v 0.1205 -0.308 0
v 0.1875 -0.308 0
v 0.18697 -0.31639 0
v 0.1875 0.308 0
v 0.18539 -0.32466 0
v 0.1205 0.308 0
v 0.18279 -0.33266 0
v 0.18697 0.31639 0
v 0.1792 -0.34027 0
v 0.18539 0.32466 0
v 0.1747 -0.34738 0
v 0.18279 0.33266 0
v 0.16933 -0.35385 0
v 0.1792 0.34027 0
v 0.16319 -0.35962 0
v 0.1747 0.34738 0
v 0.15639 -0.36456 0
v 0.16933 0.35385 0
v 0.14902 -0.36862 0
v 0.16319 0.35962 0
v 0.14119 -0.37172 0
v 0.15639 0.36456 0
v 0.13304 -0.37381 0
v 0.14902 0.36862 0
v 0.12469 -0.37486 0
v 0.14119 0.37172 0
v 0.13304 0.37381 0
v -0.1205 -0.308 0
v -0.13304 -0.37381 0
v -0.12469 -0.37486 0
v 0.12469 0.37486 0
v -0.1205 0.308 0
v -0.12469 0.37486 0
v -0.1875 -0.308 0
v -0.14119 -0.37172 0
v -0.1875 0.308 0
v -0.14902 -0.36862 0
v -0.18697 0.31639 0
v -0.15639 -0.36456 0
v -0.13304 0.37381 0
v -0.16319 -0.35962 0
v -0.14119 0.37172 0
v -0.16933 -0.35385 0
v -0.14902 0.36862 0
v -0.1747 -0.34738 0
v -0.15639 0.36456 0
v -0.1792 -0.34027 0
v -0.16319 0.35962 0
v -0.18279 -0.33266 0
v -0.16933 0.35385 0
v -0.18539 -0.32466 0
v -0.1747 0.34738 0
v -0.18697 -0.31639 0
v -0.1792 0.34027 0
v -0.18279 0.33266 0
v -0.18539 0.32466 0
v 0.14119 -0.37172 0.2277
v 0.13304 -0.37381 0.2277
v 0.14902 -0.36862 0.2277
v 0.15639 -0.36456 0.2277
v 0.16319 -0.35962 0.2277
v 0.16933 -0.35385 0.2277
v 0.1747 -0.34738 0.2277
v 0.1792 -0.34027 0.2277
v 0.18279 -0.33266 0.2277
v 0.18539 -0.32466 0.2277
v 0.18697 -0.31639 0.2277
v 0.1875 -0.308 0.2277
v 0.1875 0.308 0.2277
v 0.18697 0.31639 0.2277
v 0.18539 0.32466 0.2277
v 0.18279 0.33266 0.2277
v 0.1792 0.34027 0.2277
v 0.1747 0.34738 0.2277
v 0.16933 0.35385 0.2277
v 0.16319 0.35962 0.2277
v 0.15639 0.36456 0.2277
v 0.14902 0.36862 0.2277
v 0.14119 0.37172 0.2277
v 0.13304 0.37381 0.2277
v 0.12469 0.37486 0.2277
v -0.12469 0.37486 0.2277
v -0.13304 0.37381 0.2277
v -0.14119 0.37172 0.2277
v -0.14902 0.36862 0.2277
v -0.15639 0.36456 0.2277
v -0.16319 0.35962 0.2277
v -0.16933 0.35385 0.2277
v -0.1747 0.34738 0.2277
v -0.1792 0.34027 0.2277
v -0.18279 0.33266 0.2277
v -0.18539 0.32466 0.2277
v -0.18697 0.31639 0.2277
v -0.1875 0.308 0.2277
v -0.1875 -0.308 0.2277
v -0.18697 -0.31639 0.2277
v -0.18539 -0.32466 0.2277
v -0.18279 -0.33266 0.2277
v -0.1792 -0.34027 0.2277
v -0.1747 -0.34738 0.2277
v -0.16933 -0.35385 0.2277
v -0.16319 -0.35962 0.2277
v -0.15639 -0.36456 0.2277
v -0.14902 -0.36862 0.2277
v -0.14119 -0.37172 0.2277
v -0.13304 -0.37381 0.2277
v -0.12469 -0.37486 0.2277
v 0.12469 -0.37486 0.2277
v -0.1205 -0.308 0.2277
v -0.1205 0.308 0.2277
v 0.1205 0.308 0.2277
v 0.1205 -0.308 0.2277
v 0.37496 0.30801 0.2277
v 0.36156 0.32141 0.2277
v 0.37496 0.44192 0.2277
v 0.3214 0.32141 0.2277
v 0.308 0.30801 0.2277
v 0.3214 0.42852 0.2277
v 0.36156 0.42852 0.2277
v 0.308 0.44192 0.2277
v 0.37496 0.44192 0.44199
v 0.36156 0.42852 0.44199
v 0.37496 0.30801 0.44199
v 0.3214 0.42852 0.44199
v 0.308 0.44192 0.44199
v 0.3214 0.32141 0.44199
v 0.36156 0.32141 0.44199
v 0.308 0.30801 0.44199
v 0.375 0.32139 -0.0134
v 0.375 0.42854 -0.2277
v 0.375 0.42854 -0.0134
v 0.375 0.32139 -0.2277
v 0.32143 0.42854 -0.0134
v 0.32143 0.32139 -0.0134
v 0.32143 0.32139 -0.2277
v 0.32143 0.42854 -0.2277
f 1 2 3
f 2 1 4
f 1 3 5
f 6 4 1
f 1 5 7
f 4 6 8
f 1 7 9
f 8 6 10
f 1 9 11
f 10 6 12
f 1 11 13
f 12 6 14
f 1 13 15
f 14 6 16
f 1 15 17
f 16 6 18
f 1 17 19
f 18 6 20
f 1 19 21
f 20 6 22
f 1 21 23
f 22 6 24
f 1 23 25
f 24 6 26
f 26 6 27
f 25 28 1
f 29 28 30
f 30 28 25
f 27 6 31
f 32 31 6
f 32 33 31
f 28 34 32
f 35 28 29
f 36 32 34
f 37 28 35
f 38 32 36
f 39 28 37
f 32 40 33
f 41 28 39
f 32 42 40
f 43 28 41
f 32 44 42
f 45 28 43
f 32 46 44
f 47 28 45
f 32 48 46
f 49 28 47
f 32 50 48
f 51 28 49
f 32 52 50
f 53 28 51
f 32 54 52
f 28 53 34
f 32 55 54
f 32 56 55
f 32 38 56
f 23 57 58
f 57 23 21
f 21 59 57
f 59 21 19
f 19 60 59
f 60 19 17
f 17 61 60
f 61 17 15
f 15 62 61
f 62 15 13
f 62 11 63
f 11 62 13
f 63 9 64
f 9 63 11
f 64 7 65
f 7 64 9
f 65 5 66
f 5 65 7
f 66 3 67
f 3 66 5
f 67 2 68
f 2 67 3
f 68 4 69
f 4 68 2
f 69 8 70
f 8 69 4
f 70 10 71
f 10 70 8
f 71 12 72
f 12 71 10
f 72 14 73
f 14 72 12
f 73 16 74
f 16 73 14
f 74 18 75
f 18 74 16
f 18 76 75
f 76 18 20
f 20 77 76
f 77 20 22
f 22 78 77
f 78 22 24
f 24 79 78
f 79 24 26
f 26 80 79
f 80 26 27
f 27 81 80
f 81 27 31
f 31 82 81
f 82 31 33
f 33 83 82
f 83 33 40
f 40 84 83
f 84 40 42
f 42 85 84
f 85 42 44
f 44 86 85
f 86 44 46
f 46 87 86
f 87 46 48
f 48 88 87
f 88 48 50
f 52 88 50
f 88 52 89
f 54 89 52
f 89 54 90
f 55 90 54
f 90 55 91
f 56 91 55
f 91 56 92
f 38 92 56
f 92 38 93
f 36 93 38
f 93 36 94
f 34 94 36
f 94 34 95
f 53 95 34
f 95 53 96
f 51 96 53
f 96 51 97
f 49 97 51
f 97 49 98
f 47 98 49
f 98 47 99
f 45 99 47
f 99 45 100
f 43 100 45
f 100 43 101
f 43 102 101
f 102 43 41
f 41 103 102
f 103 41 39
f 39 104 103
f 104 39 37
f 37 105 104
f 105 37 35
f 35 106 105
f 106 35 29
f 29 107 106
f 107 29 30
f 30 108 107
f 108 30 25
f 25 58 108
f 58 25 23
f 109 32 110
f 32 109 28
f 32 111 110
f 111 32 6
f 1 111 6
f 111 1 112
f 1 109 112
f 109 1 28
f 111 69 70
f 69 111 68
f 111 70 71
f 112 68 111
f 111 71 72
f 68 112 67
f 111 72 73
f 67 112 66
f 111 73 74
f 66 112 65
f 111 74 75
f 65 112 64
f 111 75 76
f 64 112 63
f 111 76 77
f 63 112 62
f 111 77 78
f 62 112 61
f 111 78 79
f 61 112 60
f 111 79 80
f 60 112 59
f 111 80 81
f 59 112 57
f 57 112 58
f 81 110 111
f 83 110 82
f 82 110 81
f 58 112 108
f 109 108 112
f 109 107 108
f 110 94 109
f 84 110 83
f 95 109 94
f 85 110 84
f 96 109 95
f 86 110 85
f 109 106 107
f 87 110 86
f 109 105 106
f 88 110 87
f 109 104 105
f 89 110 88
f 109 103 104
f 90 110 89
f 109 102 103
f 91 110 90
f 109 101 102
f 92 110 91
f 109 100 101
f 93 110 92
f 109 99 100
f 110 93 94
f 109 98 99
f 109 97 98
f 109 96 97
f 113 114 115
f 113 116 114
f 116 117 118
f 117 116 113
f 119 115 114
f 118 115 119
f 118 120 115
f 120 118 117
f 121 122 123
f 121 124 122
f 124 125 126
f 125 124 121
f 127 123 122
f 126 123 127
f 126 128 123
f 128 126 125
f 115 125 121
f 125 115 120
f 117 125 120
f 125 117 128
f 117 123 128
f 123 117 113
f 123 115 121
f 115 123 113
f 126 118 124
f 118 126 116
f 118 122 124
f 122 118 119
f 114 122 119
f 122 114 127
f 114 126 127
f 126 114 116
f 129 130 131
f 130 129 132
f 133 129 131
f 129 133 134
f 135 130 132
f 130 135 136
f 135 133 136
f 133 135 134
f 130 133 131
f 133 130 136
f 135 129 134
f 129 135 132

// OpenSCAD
// Parameters
base_length = 0.375;
base_width = 0.75;
base_height = 0.013393;
base_corner_r = 0.067;          // Corner radius derived from footprint geometry
$fn = 50;

body_reach = 0.2277;
body_height = body_reach - base_height;

// Inner opening for frame profile (constant wall = corner radius)
inner_length = base_length - 2 * base_corner_r;
inner_width = base_width - 2 * base_corner_r;

// Raised sleeve/post
sleeve_length = 0.066964;
sleeve_width = 0.133929;
sleeve_height = 0.214286;
sleeve_left = 0.308;
sleeve_front = 0.308;
sleeve_wall = 0.0134;

// Lower continuation post
lower_top = -0.0134;
lower_bottom = -0.2277;
lower_height = lower_top - lower_bottom;
lower_length = sleeve_length * 0.8;
lower_width = sleeve_width * 0.8;

// Side blind holes
hole_radius = 0.0067;
hole_depth = 0.0134;
hole_x = 0.3616;
hole_y1 = 0.0672;
hole_y2 = 0.6828;
hole_z = (0.1674 + 0.1808) / 2;

// 2D rounded rectangle with exact bounding box
module rounded_rect(w, h, r) {
    dx = w/2 - r;
    dy = h/2 - r;
    hull() {
        translate([-dx, -dy]) circle(r);
        translate([ dx, -dy]) circle(r);
        translate([-dx,  dy]) circle(r);
        translate([ dx,  dy]) circle(r);
    }
}

// Base & body profile: outer rounded rect with central rectangular opening
module frame_profile() {
    difference() {
        rounded_rect(base_length, base_width, base_corner_r);
        square([inner_length, inner_width], center=true);
    }
}

// Sleeve profile: hollow rectangular tube
module sleeve_profile() {
    difference() {
        square([sleeve_length, sleeve_width], center=true);
        square([sleeve_length - 2*sleeve_wall, sleeve_width - 2*sleeve_wall], center=true);
    }
}

// Main assembly
difference() {
    union() {
        // Base flange (z = 0 to base_height)
        linear_extrude(height = base_height)
            frame_profile();

        // Second upper solid (z = base_height to body_reach)
        translate([0, 0, base_height])
            linear_extrude(height = body_height)
            frame_profile();

        // Raised sleeve/post on right wall
        translate([sleeve_left + sleeve_length/2, sleeve_front + sleeve_width/2, body_reach])
            linear_extrude(height = sleeve_height)
            sleeve_profile();

        // Lower continuation post beneath sleeve, sharing right edge
        translate([base_length - lower_length/2, sleeve_front + sleeve_width/2, lower_bottom + lower_height/2])
            cube([lower_length, lower_width, lower_height], center=true);
    }

    // Two blind circular holes from right face
    for (y = [hole_y1, hole_y2]) {
        translate([hole_x, y, hole_z])
            rotate([0, 90, 0])
            cylinder(h = hole_depth, r = hole_radius, center = false);
    }
}
